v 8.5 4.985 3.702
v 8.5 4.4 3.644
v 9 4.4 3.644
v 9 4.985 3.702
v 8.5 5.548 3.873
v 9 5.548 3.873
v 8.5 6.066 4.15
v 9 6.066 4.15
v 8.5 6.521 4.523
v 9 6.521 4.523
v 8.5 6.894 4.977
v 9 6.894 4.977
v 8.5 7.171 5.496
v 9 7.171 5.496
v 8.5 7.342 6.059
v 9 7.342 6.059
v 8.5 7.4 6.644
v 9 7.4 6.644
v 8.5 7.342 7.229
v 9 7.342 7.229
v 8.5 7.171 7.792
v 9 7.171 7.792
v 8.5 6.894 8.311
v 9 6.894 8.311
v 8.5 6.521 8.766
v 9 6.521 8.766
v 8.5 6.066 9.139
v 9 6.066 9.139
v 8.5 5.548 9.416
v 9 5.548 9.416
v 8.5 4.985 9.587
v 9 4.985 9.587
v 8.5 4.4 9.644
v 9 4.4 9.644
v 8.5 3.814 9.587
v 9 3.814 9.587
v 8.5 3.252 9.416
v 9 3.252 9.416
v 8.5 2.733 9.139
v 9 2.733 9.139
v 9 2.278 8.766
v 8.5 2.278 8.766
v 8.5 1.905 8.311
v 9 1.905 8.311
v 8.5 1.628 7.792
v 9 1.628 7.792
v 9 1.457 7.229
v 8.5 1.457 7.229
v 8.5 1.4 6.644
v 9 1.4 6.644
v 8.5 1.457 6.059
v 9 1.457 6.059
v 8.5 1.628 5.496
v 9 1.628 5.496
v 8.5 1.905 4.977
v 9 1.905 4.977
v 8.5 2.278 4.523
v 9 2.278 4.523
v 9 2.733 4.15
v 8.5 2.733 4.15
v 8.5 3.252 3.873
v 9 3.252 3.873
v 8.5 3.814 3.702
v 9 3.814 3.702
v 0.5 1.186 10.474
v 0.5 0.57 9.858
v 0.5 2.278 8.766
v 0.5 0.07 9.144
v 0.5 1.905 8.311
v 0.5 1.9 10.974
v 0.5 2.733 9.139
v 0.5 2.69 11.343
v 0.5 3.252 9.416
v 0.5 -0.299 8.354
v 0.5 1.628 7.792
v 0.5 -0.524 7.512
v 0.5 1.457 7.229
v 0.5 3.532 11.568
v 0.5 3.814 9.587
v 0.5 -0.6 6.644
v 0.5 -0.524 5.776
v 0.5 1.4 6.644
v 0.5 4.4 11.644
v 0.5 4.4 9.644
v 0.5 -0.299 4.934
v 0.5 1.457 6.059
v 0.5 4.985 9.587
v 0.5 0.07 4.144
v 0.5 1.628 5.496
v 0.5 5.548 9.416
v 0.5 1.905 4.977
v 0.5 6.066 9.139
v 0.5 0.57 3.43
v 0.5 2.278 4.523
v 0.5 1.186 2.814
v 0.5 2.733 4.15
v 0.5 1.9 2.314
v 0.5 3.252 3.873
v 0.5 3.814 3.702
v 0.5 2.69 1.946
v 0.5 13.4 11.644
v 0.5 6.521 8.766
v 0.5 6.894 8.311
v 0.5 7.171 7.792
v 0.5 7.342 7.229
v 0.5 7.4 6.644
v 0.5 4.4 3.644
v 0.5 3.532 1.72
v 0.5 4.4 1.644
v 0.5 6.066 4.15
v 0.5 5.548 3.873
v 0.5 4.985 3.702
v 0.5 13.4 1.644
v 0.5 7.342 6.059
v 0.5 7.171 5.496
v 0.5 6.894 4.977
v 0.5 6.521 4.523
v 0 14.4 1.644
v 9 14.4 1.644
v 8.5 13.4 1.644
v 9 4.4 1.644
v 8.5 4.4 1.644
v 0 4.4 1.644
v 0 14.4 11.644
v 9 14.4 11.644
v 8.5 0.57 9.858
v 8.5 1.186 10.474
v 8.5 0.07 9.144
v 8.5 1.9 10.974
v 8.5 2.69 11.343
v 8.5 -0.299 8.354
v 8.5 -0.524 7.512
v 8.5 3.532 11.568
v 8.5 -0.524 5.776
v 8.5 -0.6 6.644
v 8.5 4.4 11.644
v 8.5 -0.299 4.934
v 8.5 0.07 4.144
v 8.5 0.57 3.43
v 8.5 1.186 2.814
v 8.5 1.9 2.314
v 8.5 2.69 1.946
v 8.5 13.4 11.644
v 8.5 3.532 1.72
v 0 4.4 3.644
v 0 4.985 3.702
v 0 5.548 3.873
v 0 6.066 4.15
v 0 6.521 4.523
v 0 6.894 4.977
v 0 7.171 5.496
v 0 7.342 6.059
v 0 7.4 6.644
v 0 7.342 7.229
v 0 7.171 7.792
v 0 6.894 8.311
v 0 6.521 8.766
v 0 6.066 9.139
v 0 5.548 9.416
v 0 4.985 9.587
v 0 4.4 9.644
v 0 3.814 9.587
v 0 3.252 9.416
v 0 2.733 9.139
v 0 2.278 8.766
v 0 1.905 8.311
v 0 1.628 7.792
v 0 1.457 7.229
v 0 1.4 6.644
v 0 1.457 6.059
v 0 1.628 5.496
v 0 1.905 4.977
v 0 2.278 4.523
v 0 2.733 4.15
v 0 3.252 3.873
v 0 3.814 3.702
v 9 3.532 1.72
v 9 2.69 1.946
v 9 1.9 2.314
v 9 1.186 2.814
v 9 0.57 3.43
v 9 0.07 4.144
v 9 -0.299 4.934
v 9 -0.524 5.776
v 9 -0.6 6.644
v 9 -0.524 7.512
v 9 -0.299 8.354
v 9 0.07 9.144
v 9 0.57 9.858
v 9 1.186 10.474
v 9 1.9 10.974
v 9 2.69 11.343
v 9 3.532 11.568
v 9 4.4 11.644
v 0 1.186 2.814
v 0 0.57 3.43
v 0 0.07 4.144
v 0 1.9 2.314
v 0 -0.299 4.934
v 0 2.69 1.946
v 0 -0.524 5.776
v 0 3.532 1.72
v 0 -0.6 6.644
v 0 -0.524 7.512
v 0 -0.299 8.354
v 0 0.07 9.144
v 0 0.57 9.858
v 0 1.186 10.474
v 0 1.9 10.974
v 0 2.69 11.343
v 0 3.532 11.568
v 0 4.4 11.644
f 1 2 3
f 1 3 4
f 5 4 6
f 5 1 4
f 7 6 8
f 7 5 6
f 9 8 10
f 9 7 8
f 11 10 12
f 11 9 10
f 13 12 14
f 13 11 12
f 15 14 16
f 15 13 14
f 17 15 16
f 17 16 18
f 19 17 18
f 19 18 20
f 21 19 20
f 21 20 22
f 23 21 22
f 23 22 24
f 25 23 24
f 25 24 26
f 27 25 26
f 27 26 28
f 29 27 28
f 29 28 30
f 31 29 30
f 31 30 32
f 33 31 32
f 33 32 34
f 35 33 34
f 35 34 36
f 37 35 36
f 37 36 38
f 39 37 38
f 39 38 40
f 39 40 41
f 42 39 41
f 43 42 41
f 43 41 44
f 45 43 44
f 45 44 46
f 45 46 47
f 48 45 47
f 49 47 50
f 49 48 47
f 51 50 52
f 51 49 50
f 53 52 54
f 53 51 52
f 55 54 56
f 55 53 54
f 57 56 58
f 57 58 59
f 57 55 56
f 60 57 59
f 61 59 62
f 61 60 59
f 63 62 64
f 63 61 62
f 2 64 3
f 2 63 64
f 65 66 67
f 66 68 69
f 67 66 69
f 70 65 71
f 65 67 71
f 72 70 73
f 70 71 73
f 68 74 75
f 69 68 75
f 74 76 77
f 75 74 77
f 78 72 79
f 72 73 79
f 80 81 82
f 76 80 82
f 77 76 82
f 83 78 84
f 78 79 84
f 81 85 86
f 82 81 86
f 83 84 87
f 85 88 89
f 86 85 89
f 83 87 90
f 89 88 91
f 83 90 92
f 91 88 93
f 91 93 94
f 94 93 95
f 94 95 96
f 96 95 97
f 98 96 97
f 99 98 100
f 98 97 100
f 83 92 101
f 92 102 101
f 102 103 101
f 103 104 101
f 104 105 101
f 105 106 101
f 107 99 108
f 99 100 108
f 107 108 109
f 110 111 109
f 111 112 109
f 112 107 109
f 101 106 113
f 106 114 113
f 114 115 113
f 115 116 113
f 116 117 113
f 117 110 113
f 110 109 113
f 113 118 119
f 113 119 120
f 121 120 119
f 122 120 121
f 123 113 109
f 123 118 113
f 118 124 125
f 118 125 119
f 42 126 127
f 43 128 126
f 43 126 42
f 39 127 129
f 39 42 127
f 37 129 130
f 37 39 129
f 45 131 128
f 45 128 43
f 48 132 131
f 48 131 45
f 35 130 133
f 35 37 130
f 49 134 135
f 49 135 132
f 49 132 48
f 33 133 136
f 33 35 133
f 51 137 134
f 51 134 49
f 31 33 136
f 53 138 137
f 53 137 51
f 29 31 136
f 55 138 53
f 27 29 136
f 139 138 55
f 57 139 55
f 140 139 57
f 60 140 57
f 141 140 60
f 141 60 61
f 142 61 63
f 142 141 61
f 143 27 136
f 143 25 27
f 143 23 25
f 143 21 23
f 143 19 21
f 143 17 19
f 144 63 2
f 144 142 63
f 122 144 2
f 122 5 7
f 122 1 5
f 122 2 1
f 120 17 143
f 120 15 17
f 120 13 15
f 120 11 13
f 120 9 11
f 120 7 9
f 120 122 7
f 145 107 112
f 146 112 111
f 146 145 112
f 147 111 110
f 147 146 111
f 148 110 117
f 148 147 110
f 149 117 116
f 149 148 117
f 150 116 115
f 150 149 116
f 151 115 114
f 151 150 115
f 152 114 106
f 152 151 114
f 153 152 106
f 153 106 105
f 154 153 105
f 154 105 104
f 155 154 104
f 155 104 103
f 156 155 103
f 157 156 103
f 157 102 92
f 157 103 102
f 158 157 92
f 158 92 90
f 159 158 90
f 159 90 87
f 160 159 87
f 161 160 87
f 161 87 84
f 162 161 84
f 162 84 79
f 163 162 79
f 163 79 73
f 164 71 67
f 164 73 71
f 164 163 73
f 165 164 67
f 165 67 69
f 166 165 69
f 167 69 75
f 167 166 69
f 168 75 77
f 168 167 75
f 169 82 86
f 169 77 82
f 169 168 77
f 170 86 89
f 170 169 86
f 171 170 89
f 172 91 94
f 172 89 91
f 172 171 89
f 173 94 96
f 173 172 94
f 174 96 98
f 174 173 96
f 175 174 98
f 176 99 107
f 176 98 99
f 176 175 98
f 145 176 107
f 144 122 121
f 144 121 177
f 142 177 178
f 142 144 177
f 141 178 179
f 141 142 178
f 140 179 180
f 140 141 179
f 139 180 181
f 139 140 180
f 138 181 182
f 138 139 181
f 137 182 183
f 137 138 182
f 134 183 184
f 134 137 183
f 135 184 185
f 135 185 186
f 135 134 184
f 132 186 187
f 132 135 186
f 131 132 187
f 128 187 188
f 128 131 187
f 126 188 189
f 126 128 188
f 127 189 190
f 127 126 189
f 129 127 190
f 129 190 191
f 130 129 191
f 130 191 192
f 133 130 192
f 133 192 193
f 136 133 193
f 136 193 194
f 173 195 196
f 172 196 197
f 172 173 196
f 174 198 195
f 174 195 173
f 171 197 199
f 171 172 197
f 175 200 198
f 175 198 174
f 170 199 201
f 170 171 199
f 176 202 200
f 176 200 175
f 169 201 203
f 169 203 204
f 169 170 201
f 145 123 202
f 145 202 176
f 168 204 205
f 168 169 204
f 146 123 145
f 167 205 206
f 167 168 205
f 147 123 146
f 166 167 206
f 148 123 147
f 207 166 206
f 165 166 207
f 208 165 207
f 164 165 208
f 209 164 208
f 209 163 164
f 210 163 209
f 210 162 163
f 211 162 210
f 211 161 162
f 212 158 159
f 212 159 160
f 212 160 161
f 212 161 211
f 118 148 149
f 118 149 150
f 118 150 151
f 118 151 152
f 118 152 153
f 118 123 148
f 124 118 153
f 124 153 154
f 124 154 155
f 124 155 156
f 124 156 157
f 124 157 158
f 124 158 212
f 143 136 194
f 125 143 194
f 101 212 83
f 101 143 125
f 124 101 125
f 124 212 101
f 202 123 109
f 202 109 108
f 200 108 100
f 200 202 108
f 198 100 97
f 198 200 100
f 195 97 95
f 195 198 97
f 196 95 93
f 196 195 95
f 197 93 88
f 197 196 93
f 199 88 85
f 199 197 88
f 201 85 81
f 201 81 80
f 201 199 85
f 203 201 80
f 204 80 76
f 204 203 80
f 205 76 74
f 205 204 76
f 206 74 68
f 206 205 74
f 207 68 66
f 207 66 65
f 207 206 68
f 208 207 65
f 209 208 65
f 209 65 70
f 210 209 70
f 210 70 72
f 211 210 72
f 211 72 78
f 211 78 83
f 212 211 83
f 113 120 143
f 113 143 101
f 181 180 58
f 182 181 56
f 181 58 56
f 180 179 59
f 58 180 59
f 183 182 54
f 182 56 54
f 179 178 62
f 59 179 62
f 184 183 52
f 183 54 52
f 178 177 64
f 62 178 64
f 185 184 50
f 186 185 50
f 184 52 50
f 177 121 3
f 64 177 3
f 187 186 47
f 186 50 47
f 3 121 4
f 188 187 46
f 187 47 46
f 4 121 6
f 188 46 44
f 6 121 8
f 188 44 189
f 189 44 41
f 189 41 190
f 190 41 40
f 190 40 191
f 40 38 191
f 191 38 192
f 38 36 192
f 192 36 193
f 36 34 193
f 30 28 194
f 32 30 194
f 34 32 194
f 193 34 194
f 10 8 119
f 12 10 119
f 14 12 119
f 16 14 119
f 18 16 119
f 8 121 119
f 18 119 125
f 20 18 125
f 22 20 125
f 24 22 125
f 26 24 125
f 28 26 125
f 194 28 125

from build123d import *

# Parameters (mm, degrees)
SKETCH1_R           = 3
BOSS_EXTRUDE1_DEPTH = 9
SKETCH3_W           = 8
SKETCH3_H           = 14.926112698
CUT_EXTRUDE1_DEPTH  = 12


with BuildPart() as part:
    # Sketch1 → Boss-Extrude1 (new body)
    with BuildSketch(Plane(origin=(0, 0, 0), x_dir=(0, 0, -1), z_dir=(1, 0, 0))):
        with BuildLine():
            Line((-11.644204214, 4.399749293), (-11.644204214, 14.399749293))
            Line((-11.644204214, 14.399749293), (-1.644204214, 14.399749293))
            Line((-1.644204214, 14.399749293), (-1.644204214, 4.399749293))
            ThreePointArc((-1.644204214, 4.399749293), (-6.644204214, -0.600250707), (-11.644204214, 4.399749293))
        make_face()
        with Locations((-6.644204214, 4.399749293)):
            Circle(SKETCH1_R, mode=Mode.SUBTRACT)
    extrude(amount=BOSS_EXTRUDE1_DEPTH)

    # Sketch3 → Cut-Extrude1 (cut)
    with BuildSketch(Plane(origin=(0, 0, 1.644204214), x_dir=(-1, 0, 0), z_dir=(0, 0, -1))):
        with Locations((-4.5, 5.936692944)):
            Rectangle(SKETCH3_W, SKETCH3_H)
    extrude(amount=-CUT_EXTRUDE1_DEPTH, mode=Mode.SUBTRACT)


solid = part.part
